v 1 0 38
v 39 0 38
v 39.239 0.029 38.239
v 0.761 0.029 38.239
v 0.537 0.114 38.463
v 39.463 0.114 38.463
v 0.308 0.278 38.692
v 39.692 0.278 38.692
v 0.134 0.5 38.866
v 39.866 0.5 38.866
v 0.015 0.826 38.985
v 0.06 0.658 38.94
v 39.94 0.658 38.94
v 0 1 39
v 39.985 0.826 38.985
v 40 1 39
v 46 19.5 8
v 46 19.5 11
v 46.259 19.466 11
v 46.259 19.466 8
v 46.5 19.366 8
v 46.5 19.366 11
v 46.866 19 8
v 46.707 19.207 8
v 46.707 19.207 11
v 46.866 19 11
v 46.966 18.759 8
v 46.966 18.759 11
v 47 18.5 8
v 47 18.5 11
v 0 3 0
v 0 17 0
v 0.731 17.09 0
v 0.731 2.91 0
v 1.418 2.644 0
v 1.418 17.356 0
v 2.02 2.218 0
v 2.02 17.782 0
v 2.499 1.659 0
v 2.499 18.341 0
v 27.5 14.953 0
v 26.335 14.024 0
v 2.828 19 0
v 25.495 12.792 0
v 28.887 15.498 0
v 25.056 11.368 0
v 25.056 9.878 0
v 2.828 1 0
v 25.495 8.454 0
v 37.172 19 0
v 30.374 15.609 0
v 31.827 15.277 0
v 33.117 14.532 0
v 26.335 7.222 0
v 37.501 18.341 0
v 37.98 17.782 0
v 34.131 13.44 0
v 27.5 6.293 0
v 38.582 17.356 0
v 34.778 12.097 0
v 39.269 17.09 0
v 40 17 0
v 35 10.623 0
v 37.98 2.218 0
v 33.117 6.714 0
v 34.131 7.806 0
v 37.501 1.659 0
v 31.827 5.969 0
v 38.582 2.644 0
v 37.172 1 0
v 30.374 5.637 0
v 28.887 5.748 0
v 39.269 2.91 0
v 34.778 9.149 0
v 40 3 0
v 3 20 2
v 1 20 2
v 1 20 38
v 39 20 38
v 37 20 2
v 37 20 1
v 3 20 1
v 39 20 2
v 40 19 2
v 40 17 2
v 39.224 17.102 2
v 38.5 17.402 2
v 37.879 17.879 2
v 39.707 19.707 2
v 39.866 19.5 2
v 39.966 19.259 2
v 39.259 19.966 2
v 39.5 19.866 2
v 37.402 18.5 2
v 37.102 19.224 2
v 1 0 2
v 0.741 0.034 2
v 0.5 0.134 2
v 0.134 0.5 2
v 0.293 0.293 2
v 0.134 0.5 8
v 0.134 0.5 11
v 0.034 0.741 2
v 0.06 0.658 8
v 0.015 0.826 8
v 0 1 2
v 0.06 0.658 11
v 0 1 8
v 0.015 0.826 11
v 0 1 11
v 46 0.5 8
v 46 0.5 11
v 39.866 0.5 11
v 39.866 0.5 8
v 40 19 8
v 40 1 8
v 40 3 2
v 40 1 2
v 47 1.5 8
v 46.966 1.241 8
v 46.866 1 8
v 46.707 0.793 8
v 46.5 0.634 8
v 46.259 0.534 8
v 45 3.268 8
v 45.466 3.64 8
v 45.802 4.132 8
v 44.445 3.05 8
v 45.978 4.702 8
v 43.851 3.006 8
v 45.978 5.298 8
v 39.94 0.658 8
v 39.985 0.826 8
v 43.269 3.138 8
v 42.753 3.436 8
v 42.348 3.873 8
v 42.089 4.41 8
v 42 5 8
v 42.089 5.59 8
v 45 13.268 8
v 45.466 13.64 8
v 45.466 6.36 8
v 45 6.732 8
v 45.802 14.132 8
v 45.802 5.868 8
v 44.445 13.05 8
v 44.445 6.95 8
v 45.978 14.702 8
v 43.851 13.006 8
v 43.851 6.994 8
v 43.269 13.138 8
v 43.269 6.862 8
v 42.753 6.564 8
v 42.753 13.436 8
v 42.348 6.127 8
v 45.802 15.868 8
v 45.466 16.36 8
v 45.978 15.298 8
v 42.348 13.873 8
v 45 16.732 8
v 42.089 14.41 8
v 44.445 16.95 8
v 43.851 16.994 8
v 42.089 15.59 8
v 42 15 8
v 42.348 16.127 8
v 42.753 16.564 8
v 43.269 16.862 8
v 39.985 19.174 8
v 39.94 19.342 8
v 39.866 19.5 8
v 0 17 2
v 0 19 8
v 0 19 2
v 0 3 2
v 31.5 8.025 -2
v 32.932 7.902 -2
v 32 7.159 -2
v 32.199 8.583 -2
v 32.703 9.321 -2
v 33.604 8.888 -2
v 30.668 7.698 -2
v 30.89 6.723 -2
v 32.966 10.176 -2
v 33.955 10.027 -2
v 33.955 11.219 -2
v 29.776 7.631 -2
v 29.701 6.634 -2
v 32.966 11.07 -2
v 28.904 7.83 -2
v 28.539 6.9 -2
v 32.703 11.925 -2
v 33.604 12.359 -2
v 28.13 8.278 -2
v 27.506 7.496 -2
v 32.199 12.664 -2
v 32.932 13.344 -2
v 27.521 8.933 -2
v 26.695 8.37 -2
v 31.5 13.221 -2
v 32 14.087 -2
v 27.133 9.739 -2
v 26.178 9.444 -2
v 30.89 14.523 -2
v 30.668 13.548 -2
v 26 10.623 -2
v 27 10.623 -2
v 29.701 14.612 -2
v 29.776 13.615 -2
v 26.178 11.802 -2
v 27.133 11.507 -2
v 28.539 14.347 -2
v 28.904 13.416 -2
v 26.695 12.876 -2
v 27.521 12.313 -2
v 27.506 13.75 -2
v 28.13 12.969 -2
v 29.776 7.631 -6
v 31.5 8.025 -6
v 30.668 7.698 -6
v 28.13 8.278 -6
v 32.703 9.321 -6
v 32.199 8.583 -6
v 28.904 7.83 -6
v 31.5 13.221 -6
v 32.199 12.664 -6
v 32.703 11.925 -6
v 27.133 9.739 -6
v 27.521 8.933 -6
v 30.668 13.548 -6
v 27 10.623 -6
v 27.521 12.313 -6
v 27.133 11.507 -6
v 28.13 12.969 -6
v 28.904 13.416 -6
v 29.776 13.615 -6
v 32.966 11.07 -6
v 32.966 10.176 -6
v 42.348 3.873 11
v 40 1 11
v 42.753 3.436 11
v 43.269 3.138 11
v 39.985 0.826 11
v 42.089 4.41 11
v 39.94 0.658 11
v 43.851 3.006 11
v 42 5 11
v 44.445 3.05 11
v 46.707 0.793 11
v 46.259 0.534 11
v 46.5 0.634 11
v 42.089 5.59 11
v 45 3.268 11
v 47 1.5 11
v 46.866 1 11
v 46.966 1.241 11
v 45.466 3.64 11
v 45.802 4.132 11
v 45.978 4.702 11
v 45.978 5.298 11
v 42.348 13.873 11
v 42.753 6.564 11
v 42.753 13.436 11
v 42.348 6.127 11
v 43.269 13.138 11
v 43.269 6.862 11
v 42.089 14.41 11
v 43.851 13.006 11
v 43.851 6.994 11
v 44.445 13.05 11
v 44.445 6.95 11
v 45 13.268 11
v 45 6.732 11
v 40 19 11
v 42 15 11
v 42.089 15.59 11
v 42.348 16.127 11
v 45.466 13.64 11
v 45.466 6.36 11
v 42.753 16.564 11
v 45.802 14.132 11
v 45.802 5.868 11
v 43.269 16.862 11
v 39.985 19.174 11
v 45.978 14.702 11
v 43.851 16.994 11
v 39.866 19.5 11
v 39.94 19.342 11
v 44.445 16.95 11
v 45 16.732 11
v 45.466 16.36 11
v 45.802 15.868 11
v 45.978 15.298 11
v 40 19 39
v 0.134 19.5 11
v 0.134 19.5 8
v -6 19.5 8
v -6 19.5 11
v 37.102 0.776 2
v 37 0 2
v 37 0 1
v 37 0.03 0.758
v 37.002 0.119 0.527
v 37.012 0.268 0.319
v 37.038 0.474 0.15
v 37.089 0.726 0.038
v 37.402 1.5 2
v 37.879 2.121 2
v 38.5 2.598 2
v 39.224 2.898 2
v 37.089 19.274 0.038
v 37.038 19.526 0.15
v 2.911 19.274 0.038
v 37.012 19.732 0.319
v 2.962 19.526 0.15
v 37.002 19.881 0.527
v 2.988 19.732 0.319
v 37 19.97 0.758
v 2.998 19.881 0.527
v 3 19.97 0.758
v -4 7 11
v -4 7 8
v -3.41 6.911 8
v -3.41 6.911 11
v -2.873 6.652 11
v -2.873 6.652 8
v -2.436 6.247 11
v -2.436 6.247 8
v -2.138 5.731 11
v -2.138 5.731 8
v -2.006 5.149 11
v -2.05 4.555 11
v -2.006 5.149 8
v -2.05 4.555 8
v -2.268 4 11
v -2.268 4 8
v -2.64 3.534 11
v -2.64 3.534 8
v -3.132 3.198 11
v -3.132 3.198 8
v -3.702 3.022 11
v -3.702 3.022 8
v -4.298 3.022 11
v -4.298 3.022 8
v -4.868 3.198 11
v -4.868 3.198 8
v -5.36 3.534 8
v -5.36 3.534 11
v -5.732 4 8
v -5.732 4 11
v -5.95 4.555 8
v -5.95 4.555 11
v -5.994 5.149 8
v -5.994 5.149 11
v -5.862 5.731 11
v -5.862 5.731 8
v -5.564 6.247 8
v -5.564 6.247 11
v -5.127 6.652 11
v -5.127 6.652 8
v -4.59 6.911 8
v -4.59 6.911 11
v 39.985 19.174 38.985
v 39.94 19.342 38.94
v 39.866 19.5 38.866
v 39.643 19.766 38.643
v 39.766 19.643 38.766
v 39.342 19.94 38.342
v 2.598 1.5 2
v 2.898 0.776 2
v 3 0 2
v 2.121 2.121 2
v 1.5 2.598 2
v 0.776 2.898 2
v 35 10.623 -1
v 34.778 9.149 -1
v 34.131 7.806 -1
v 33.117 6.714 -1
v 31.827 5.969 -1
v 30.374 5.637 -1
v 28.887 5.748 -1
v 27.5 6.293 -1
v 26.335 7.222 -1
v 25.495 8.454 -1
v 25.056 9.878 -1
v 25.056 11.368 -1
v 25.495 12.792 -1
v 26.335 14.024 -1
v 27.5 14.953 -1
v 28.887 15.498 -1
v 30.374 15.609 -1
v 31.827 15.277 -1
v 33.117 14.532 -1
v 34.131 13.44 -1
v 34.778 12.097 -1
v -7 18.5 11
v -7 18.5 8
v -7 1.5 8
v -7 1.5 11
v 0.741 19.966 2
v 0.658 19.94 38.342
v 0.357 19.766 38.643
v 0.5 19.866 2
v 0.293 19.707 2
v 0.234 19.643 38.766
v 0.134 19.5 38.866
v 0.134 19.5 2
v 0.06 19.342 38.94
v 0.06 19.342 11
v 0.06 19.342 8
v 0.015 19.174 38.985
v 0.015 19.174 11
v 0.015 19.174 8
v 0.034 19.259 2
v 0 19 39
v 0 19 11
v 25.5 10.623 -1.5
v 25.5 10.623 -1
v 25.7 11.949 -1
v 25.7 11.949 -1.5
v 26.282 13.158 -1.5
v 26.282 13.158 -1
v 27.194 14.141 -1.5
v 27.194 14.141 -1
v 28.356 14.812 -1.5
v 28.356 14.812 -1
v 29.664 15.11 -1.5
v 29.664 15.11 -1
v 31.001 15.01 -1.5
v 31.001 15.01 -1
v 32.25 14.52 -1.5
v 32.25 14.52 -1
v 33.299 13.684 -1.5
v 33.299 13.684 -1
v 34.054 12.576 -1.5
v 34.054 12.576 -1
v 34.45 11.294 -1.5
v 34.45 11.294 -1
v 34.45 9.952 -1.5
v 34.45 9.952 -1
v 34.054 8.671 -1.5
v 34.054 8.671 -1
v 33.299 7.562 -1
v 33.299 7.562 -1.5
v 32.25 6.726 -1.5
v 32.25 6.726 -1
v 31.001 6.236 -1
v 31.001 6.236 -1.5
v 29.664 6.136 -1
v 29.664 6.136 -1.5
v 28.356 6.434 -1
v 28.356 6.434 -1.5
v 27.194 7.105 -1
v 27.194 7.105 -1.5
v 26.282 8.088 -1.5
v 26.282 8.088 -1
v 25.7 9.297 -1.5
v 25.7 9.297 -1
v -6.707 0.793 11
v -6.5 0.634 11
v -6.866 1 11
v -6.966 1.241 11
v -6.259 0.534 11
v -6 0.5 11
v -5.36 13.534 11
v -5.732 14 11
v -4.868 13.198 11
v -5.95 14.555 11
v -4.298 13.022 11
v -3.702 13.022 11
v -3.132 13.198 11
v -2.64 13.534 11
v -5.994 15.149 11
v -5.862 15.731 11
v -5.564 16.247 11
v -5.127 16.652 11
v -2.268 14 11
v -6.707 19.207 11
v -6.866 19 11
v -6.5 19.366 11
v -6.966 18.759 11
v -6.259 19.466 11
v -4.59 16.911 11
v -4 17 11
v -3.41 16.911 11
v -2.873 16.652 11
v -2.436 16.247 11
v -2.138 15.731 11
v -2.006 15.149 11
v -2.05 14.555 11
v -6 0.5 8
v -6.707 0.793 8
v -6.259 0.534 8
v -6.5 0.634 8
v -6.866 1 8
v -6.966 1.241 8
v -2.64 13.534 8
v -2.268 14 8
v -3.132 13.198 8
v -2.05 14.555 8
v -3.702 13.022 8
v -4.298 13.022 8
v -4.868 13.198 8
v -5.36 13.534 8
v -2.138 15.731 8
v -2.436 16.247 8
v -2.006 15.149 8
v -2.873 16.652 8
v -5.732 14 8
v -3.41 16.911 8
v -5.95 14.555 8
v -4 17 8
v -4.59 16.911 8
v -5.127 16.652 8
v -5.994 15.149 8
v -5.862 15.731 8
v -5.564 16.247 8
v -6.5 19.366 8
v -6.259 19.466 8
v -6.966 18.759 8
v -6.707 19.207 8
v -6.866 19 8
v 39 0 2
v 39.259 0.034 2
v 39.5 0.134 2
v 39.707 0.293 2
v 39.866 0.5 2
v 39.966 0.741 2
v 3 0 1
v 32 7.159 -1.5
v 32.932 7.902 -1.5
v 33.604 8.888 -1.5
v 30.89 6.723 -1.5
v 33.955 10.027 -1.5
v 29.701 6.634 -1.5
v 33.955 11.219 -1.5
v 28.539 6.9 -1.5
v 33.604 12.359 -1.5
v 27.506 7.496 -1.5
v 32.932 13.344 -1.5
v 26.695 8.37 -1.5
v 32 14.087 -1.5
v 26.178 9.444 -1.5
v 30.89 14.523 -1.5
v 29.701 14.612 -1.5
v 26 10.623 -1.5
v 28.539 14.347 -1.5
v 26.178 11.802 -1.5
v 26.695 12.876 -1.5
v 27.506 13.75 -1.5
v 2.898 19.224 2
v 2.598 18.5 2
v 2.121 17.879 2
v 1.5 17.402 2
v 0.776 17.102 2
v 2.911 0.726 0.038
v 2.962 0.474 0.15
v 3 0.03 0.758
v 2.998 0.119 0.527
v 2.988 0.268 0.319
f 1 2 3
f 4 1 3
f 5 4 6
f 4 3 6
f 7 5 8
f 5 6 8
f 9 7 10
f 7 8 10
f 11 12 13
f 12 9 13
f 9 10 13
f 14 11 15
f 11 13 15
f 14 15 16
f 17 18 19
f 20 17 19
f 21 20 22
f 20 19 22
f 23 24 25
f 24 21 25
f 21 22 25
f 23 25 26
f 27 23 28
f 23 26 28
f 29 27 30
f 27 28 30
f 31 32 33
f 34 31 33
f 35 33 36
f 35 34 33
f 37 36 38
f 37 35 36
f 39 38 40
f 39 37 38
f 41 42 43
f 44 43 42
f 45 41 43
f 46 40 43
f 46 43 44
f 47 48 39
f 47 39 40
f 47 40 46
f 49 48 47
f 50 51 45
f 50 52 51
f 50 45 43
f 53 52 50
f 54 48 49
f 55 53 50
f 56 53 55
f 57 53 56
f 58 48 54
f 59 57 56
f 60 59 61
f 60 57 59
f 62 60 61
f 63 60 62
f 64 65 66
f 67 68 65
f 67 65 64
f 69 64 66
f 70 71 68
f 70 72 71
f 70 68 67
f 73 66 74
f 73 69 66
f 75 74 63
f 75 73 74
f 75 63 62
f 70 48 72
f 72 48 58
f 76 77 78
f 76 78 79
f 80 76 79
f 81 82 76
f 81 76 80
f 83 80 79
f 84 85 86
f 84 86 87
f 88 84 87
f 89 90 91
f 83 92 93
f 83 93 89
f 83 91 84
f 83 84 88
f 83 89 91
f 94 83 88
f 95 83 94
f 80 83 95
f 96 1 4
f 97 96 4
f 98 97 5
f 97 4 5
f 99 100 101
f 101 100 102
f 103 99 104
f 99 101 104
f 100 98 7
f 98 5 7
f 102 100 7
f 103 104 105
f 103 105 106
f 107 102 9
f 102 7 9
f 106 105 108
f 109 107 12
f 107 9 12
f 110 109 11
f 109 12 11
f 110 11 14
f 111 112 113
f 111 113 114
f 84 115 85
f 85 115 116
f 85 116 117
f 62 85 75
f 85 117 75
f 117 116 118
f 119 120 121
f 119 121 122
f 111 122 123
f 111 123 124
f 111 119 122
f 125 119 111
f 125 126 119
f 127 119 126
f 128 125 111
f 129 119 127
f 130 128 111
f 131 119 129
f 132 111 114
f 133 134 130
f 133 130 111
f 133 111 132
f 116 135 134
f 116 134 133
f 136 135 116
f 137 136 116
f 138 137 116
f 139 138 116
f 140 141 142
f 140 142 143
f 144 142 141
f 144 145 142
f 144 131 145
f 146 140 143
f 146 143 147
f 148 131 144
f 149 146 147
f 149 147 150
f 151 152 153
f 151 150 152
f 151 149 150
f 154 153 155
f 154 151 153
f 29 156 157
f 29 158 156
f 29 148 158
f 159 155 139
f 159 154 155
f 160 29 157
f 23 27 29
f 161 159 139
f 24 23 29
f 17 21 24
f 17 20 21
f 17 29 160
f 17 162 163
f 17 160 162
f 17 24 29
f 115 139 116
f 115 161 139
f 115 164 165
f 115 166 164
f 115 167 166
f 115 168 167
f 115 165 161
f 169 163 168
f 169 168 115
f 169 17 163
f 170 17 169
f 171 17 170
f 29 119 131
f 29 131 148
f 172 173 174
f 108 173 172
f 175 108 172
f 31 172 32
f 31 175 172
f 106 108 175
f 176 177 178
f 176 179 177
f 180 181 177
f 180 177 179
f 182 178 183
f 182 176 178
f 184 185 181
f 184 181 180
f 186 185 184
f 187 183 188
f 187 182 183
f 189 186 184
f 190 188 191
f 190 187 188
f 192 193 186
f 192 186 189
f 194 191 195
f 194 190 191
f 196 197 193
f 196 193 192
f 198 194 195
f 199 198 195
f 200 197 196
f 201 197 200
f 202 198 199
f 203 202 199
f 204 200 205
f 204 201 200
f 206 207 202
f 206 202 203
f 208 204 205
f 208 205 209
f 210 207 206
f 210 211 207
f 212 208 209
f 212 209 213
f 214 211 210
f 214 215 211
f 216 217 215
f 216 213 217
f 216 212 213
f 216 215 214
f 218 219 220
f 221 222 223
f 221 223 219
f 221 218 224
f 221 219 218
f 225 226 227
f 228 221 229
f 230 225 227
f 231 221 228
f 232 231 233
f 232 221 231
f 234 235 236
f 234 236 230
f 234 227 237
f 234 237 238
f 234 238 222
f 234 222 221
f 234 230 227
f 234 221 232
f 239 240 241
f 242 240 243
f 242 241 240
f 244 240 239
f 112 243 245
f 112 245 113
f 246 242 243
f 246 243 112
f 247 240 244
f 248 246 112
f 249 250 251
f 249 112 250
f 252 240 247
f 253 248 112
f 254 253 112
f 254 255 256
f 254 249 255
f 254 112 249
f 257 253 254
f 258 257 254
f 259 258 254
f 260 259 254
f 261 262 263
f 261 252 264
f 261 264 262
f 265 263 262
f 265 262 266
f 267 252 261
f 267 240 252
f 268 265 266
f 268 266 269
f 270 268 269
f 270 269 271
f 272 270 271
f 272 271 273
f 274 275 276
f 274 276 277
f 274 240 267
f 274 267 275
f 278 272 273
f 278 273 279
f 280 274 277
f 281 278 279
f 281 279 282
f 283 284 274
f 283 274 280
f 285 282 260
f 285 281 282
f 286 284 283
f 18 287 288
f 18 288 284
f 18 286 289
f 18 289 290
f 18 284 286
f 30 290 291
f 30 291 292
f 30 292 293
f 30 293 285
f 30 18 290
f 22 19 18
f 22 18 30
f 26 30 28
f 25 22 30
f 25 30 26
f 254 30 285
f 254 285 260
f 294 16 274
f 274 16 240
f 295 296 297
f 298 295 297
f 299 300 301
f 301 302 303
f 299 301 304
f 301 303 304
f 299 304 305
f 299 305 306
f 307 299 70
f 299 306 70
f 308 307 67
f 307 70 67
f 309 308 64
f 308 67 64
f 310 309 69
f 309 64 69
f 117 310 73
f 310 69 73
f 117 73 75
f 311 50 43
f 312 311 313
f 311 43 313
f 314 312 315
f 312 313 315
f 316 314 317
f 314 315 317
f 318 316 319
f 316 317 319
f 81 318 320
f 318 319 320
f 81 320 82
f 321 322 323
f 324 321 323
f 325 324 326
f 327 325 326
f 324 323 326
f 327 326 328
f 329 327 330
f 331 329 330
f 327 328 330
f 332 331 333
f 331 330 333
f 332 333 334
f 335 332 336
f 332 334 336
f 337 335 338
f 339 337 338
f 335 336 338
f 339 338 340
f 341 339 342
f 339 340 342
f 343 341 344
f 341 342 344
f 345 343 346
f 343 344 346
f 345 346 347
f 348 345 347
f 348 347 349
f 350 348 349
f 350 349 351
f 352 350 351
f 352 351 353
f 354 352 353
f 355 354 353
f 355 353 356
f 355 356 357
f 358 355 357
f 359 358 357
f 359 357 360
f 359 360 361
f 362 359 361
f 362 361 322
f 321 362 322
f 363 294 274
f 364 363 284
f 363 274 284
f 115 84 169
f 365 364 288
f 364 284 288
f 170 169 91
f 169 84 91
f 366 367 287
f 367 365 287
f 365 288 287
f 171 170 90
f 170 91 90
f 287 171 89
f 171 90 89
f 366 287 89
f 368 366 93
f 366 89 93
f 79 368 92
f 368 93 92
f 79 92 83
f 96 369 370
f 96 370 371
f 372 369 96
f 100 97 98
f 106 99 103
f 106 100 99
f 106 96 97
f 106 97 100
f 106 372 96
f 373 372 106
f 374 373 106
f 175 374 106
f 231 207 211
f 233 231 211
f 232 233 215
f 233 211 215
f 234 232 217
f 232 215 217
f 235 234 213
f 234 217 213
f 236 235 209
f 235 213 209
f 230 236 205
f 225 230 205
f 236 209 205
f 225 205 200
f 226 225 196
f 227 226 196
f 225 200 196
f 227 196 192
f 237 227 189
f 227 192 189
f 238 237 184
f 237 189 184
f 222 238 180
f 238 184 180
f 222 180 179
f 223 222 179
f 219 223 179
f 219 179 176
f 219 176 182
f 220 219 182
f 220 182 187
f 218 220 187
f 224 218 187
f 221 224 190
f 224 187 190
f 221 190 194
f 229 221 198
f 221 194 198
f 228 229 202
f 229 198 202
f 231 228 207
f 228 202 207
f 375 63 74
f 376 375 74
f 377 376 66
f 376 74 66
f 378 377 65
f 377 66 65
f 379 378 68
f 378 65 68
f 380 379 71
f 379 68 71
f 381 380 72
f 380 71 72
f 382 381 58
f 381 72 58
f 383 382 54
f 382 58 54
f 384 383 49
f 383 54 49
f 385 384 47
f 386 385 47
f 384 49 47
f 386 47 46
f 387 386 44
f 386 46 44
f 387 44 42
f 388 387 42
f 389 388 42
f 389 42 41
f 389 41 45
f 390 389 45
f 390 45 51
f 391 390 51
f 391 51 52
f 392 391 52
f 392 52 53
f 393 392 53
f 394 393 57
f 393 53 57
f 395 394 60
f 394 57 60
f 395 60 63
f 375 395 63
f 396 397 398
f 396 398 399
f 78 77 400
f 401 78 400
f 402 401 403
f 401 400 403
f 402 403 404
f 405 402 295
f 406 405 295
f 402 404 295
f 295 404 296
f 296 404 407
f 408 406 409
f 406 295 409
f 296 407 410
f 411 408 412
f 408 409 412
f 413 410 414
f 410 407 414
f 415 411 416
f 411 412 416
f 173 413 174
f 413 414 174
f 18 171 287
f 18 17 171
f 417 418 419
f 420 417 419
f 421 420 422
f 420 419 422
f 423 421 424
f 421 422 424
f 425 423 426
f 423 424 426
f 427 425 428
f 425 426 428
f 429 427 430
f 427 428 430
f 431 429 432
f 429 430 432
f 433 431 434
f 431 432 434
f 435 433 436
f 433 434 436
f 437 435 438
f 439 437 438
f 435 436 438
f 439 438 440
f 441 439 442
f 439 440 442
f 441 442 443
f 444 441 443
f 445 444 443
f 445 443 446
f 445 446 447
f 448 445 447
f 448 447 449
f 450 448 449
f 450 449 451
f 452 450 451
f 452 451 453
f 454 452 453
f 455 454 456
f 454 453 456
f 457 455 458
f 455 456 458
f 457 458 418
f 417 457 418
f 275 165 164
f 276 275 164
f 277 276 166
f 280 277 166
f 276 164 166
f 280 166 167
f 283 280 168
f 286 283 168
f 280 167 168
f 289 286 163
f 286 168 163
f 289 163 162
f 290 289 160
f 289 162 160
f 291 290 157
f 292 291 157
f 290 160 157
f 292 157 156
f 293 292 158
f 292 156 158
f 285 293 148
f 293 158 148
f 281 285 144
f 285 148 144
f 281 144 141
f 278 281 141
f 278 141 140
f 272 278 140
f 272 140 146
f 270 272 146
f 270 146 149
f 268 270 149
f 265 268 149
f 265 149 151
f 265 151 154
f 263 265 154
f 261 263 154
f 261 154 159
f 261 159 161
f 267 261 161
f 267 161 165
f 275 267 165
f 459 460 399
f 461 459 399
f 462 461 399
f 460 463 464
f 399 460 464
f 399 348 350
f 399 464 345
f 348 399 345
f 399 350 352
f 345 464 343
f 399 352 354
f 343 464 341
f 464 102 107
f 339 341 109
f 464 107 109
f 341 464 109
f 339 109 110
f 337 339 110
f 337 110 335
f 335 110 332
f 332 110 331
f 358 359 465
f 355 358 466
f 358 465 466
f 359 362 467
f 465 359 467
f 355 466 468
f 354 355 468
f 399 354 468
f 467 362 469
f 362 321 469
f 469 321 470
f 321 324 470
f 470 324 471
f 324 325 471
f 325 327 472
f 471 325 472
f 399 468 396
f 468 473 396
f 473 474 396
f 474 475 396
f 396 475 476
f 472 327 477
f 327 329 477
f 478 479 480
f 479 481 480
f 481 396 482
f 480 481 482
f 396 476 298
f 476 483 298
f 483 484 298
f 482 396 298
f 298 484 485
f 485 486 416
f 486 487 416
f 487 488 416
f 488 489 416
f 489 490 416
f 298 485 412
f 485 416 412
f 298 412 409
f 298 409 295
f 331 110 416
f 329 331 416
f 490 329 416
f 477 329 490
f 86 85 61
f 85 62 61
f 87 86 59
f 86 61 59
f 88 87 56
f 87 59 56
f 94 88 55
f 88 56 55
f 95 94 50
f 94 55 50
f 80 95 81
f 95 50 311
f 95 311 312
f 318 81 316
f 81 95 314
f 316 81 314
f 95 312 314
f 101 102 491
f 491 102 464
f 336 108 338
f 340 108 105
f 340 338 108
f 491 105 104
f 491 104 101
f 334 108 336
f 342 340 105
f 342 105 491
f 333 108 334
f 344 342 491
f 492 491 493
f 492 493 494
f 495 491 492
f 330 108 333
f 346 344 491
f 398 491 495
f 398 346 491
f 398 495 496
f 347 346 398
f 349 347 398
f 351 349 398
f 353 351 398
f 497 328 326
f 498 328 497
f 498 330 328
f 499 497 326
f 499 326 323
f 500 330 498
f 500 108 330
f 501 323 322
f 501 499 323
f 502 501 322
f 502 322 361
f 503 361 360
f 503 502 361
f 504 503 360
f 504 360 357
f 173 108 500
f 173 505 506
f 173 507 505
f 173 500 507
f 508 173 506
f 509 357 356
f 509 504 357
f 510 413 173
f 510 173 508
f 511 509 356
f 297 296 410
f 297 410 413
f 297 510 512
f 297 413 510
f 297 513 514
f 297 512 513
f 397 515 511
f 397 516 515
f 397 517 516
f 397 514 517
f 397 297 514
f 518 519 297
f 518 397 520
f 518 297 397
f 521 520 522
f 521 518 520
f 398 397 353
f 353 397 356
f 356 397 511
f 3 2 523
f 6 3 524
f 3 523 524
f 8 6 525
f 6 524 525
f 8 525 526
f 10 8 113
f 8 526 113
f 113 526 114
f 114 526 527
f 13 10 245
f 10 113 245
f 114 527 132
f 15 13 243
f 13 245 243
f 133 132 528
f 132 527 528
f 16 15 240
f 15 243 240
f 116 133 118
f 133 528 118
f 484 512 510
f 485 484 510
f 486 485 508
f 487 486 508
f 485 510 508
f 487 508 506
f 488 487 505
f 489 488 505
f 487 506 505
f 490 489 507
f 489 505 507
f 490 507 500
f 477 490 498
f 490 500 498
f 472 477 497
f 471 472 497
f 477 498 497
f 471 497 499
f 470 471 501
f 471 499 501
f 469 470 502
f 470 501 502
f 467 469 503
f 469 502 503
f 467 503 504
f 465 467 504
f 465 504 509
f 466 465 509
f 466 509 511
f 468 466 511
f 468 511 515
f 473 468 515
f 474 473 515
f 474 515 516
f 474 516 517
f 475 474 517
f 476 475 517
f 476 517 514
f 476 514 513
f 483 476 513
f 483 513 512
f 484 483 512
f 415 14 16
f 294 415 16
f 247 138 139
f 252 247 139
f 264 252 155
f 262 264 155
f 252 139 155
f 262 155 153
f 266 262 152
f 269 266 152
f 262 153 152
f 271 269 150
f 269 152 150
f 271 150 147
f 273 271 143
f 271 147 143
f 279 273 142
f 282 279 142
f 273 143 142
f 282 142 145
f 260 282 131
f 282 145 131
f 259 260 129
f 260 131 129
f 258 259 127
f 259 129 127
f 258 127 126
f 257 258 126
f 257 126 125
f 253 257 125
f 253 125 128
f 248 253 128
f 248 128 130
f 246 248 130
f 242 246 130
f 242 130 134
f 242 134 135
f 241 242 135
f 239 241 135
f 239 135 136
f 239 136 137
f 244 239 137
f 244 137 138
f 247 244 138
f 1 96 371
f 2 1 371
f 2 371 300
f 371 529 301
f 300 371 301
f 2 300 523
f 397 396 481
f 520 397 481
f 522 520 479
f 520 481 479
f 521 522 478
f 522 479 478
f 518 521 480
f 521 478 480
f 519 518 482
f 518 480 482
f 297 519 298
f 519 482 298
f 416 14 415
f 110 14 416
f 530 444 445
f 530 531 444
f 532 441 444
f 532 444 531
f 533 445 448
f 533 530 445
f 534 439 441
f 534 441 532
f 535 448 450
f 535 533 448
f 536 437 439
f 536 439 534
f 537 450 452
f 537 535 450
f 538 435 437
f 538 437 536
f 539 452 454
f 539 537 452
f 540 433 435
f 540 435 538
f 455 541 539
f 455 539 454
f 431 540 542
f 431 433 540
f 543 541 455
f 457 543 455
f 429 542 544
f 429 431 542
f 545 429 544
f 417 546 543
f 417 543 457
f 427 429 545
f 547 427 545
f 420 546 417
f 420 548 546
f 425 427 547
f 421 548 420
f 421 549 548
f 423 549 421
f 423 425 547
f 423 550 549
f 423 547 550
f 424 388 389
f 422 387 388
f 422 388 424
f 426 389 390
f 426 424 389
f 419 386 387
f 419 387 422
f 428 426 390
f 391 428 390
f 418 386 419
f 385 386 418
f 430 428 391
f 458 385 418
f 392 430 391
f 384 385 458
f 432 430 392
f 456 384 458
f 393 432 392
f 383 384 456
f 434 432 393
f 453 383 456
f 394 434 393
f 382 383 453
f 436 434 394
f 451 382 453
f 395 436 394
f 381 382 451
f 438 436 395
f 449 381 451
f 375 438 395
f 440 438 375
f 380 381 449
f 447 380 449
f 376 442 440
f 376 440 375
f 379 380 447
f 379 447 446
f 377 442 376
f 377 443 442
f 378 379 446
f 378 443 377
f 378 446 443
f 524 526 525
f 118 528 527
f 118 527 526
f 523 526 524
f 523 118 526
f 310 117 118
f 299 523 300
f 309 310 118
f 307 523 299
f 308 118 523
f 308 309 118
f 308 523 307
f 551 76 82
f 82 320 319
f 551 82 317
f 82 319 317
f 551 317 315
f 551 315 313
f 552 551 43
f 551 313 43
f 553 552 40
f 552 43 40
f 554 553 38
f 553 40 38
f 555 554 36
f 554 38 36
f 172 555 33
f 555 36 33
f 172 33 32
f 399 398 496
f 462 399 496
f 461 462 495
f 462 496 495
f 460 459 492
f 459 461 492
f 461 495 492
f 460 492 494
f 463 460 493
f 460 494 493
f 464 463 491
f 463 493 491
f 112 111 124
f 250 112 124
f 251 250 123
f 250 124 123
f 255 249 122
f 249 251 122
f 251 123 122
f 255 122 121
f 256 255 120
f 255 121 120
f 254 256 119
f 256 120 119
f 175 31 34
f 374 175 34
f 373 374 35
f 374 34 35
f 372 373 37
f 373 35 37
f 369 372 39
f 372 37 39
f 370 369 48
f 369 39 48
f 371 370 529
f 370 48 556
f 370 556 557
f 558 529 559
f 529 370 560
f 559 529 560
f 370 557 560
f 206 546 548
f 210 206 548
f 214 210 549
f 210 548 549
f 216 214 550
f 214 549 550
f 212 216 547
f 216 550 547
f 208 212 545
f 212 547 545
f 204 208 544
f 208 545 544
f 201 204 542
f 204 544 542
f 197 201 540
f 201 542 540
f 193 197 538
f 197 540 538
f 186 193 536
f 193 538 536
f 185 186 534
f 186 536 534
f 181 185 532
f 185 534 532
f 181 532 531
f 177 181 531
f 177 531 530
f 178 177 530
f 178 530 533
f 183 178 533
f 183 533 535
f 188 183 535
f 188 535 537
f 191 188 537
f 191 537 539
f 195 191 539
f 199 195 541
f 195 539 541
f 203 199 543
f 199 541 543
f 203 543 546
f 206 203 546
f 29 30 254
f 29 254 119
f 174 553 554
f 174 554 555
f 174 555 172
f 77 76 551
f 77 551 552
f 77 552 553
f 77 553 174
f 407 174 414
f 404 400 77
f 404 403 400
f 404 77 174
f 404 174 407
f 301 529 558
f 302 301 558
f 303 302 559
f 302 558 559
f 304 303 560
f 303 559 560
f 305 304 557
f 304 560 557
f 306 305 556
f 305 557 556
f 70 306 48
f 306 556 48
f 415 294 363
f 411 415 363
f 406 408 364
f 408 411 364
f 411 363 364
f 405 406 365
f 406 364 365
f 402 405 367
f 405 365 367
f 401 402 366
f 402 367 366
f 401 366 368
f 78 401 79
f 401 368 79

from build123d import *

# Parameters (mm, degrees)
SKETCH_1_W               = 40
SKETCH_1_H               = 39
EXTRUDE_1_DEPTH          = 20
SKETCH_6_R               = 5
EXTRUDE_3_DEPTH          = 1
SKETCH_7_R               = 4.5
EXTRUDE_4_DEPTH          = 0.5
SKETCH_8_R               = 4
EXTRUDE_5_DEPTH          = 0.5
SKETCH_9_R               = 3
EXTRUDE_6_DEPTH          = 4
SKETCH_11_W              = 3
SKETCH_11_H              = 20
EXTRUDE_7_DEPTH          = 7
SKETCH_12_R              = 2
CUT_EXTRUDE_2_DEPTH      = 7
SKETCH_13_W              = 3
SKETCH_13_H              = 20
EXTRUDE_8_DEPTH          = 7
SKETCH_14_R              = 2
CUT_EXTRUDE_3_DEPTH      = 7
SKETCH_15_R              = 3
CUT_EXTRUDE_4_DEPTH      = 2
CUT_EXTRUDE_6_DEPTH      = 65.265076052
CUT_EXTRUDE_6_DEPTH_BACK = 0.5
CUT_EXTRUDE_7_DEPTH      = 65.265076052
CUT_EXTRUDE_7_DEPTH_BACK = 0.5
CUT_EXTRUDE_8_DEPTH      = 65.265076052
CUT_EXTRUDE_8_DEPTH_BACK = 0.5
CUT_EXTRUDE_9_DEPTH      = 65.265076052
CUT_EXTRUDE_9_DEPTH_BACK = 0.5
FILLET_3_R               = 1


with BuildPart() as part:
    # 草图1 → 凸台-拉伸1 (new body)
    with BuildSketch(Plane(origin=(0, 0, 0), x_dir=(1, 0, 0), z_dir=(0, 1, 0))):
        with Locations((20, -19.5)):
            Rectangle(SKETCH_1_W, SKETCH_1_H)
    extrude(amount=EXTRUDE_1_DEPTH)

    # 草图6 → 凸台-拉伸3 (add)
    with BuildSketch(Plane(origin=(0, 0, 0), x_dir=(-1, 0, 0), z_dir=(0, 0, -1))):
        with Locations(Location((-30, 10.62304624, 0), (0, 0, 180))):
            Circle(SKETCH_6_R)
    extrude(amount=EXTRUDE_3_DEPTH)

    # 草图7 → 凸台-拉伸4 (add)
    with BuildSketch(Plane(origin=(0, 0, -1), x_dir=(-1, 0, 0), z_dir=(0, 0, -1))):
        with Locations((-30, 10.62304624)):
            Circle(SKETCH_7_R)
    extrude(amount=EXTRUDE_4_DEPTH)

    # 草图8 → 凸台-拉伸5 (add)
    with BuildSketch(Plane(origin=(0, 0, -1.5), x_dir=(-1, 0, 0), z_dir=(0, 0, -1))):
        with Locations((-30, 10.62304624)):
            Circle(SKETCH_8_R)
    extrude(amount=EXTRUDE_5_DEPTH)

    # 草图9 → 凸台-拉伸6 (add)
    with BuildSketch(Plane(origin=(0, 0, -2), x_dir=(-1, 0, 0), z_dir=(0, 0, -1))):
        with Locations((-30, 10.62304624)):
            Circle(SKETCH_9_R)
    extrude(amount=EXTRUDE_6_DEPTH)

    # 草图11 → 凸台-拉伸7 (add)
    with BuildSketch(Plane(origin=(40, 0, 0), x_dir=(0, 0, -1), z_dir=(1, 0, 0))):
        with Locations((-9.5, 10)):
            Rectangle(SKETCH_11_W, SKETCH_11_H)
    extrude(amount=EXTRUDE_7_DEPTH)

    # 草图12 → 切除-拉伸2 (cut)
    with BuildSketch(Plane(origin=(0, 0, 8), x_dir=(-1, 0, 0), z_dir=(0, 0, -1))):
        with Locations((-44, 15)):
            Circle(SKETCH_12_R)
        with Locations((-44, 5)):
            Circle(SKETCH_12_R)
    extrude(amount=-CUT_EXTRUDE_2_DEPTH, mode=Mode.SUBTRACT)

    # 草图13 → 凸台-拉伸8 (add)
    with BuildSketch(Plane.ZY):
        with Locations((9.5, 10)):
            Rectangle(SKETCH_13_W, SKETCH_13_H)
    extrude(amount=EXTRUDE_8_DEPTH)

    # 草图14 → 切除-拉伸3 (cut)
    with BuildSketch(Plane(origin=(0, 0, 8), x_dir=(-1, 0, 0), z_dir=(0, 0, -1))):
        with Locations(Location((4, 15, 0), (0, 0, 90))):
            Circle(SKETCH_14_R)
        with Locations(Location((4, 5, 0), (0, 0, 90))):
            Circle(SKETCH_14_R)
    extrude(amount=-CUT_EXTRUDE_3_DEPTH, mode=Mode.SUBTRACT)

    # 草图15 → 切除-拉伸4 (cut)
    with BuildSketch(Plane(origin=(0, 0, 0), x_dir=(-1, 0, 0), z_dir=(0, 0, -1))):
        with Locations((-40, 20)):
            Circle(SKETCH_15_R)
        with Locations((0, 20)):
            Circle(SKETCH_15_R)
        Circle(SKETCH_15_R)
        with Locations((-40, 0)):
            Circle(SKETCH_15_R)
    extrude(amount=-CUT_EXTRUDE_4_DEPTH, mode=Mode.SUBTRACT)

    # 草图16 → 切除-拉伸6 (cut, two sides: drawn at the far end of the back side and taken through both)
    with BuildSketch(Plane(origin=(0, 20, 0), x_dir=(1, 0, 0), z_dir=(0, 1, 0)).offset(-CUT_EXTRUDE_6_DEPTH_BACK)):
        Polygon((0, 114.605506082), (0, -8), (0, -11), (0, -133.605506082), (-245.211012164, -133.605506082), (-245.211012164, 114.605506082), align=None)
    extrude(amount=CUT_EXTRUDE_6_DEPTH + CUT_EXTRUDE_6_DEPTH_BACK, mode=Mode.SUBTRACT)

    # 草图17 → 切除-拉伸7 (cut, two sides: drawn at the far end of the back side and taken through both)
    with BuildSketch(Plane(origin=(0, 20, 0), x_dir=(1, 0, 0), z_dir=(0, 1, 0)).offset(-CUT_EXTRUDE_7_DEPTH_BACK)):
        Polygon((40, 114.605506082), (40, -8), (40, -11), (40, -133.605506082), (285.211012164, -133.605506082), (285.211012164, 114.605506082), align=None)
    extrude(amount=CUT_EXTRUDE_7_DEPTH + CUT_EXTRUDE_7_DEPTH_BACK, mode=Mode.SUBTRACT)

    # 草图19 → 切除-拉伸8 (cut, two sides: drawn at the far end of the back side and taken through both)
    with BuildSketch(Plane.XZ.offset(-CUT_EXTRUDE_8_DEPTH_BACK)):
        Polygon((0, 133.605506082), (0, 11), (0, 8), (0, -114.605506082), (-245.211012164, -114.605506082), (-245.211012164, 133.605506082), align=None)
    extrude(amount=CUT_EXTRUDE_8_DEPTH + CUT_EXTRUDE_8_DEPTH_BACK, mode=Mode.SUBTRACT)

    # 草图20 → 切除-拉伸9 (cut, two sides: drawn at the far end of the back side and taken through both)
    with BuildSketch(Plane.XZ.offset(-CUT_EXTRUDE_9_DEPTH_BACK)):
        Polygon((40, 133.605506082), (40, 11), (40, 8), (40, -114.605506082), (285.211012164, -114.605506082), (285.211012164, 133.605506082), align=None)
    extrude(amount=CUT_EXTRUDE_9_DEPTH + CUT_EXTRUDE_9_DEPTH_BACK, mode=Mode.SUBTRACT)

    # 圆角3
    # the kernel refuses this fillet: 1 mm, written as the material it takes off along each edge
    with BuildSketch(Plane(origin=(42.5, 0, 39), x_dir=(0, 1, 0), z_dir=(-1, 0, 0))) as fillet_3_piece_1:
        with BuildLine():
            CenterArc((FILLET_3_R, FILLET_3_R), FILLET_3_R, 180, 90)
            Line((0, FILLET_3_R), (0, 0))
            Line((0, 0), (FILLET_3_R, 0))
        make_face()
    extrude(amount=45, mode=Mode.SUBTRACT)
    with BuildSketch(Plane(origin=(42.5, 20, 39), x_dir=(0, -1, 0), z_dir=(-1, 0, 0))) as fillet_3_piece_2:
        with BuildLine():
            CenterArc((FILLET_3_R, -FILLET_3_R), FILLET_3_R, 90, 90)
            Line((0, -FILLET_3_R), (0, 0))
            Line((0, 0), (FILLET_3_R, 0))
        make_face()
    extrude(amount=45, mode=Mode.SUBTRACT)
    with BuildSketch(Plane(origin=(0, 0, 41.5), x_dir=(0, 1, 0), z_dir=(0, 0, -1))) as fillet_3_piece_3_section:
        with BuildLine():
            CenterArc((FILLET_3_R, FILLET_3_R), FILLET_3_R, 180, 90)
            Line((0, FILLET_3_R), (0, 0))
            Line((0, 0), (FILLET_3_R, 0))
        make_face()
    fillet_3_piece_3 = extrude(amount=42, mode=Mode.PRIVATE)
    fillet_3_piece_3 = split(fillet_3_piece_3, bisect_by=Plane(origin=(0.024008382, 0.663250785, 11), z_dir=(0, 0, 1)), keep=Keep.TOP, mode=Mode.PRIVATE)
    fillet_3_piece_3 = split(fillet_3_piece_3, bisect_by=Plane(origin=(0.024008382, 0.5, 26.25), z_dir=(0, 1, 0)), keep=Keep.TOP, mode=Mode.PRIVATE)
    add(fillet_3_piece_3, mode=Mode.SUBTRACT)
    with BuildSketch(Plane(origin=(0, 0, 41.5), x_dir=(0, 1, 0), z_dir=(0, 0, -1))) as fillet_3_piece_4_section:
        with BuildLine():
            CenterArc((FILLET_3_R, FILLET_3_R), FILLET_3_R, 180, 90)
            Line((0, FILLET_3_R), (0, 0))
            Line((0, 0), (FILLET_3_R, 0))
        make_face()
    fillet_3_piece_4 = extrude(amount=42, mode=Mode.PRIVATE)
    fillet_3_piece_4 = split(fillet_3_piece_4, bisect_by=Plane(origin=(0.25512006, 0.164391764, 11), z_dir=(0, 0, 1)), keep=Keep.TOP, mode=Mode.PRIVATE)
    fillet_3_piece_4 = split(fillet_3_piece_4, bisect_by=Plane(origin=(0.25512006, 0.5, 26.25), z_dir=(0, -1, 0)), keep=Keep.TOP, mode=Mode.PRIVATE)
    add(fillet_3_piece_4, mode=Mode.SUBTRACT)
    with BuildSketch(Plane(origin=(0, 0, 41.5), x_dir=(0, 1, 0), z_dir=(0, 0, -1))) as fillet_3_piece_5_section:
        with BuildLine():
            CenterArc((FILLET_3_R, FILLET_3_R), FILLET_3_R, 180, 90)
            Line((0, FILLET_3_R), (0, 0))
            Line((0, 0), (FILLET_3_R, 0))
        make_face()
    fillet_3_piece_5 = extrude(amount=42, mode=Mode.PRIVATE)
    fillet_3_piece_5 = split(fillet_3_piece_5, bisect_by=Plane(origin=(0.25512006, 0.164391764, 11), z_dir=(0, 0, -1)), keep=Keep.TOP, mode=Mode.PRIVATE)
    fillet_3_piece_5 = split(fillet_3_piece_5, bisect_by=Plane(origin=(0.25512006, 0.5, 9.5), z_dir=(0, -1, 0)), keep=Keep.TOP, mode=Mode.PRIVATE)
    fillet_3_piece_5 = split(fillet_3_piece_5, bisect_by=Plane(origin=(0.25512006, 0.164391764, 8), z_dir=(0, 0, 1)), keep=Keep.TOP, mode=Mode.PRIVATE)
    add(fillet_3_piece_5, mode=Mode.SUBTRACT)
    with BuildSketch(Plane(origin=(0, 0, 41.5), x_dir=(0, 1, 0), z_dir=(0, 0, -1))) as fillet_3_piece_6_section:
        with BuildLine():
            CenterArc((FILLET_3_R, FILLET_3_R), FILLET_3_R, 180, 90)
            Line((0, FILLET_3_R), (0, 0))
            Line((0, 0), (FILLET_3_R, 0))
        make_face()
    fillet_3_piece_6 = extrude(amount=42, mode=Mode.PRIVATE)
    fillet_3_piece_6 = split(fillet_3_piece_6, bisect_by=Plane(origin=(0.024008382, 0.5, 3.75), z_dir=(0, 1, 0)), keep=Keep.TOP, mode=Mode.PRIVATE)
    fillet_3_piece_6 = split(fillet_3_piece_6, bisect_by=Plane(origin=(0.024008382, 0.663250785, 8), z_dir=(0, 0, -1)), keep=Keep.TOP, mode=Mode.PRIVATE)
    add(fillet_3_piece_6, mode=Mode.SUBTRACT)
    with BuildSketch(Plane(origin=(0, 0, 41.5), x_dir=(0, 1, 0), z_dir=(0, 0, -1))) as fillet_3_piece_7_section:
        with BuildLine():
            CenterArc((FILLET_3_R, FILLET_3_R), FILLET_3_R, 180, 90)
            Line((0, FILLET_3_R), (0, 0))
            Line((0, 0), (FILLET_3_R, 0))
        make_face()
    fillet_3_piece_7 = extrude(amount=42, mode=Mode.PRIVATE)
    fillet_3_piece_7 = split(fillet_3_piece_7, bisect_by=Plane(origin=(0.25512006, 0.5, 3.75), z_dir=(0, -1, 0)), keep=Keep.TOP, mode=Mode.PRIVATE)
    fillet_3_piece_7 = split(fillet_3_piece_7, bisect_by=Plane(origin=(0.25512006, 0.164391764, 8), z_dir=(0, 0, -1)), keep=Keep.TOP, mode=Mode.PRIVATE)
    add(fillet_3_piece_7, mode=Mode.SUBTRACT)
    with BuildSketch(Plane(origin=(-7, 0.5, 5.5), x_dir=(0, 1, 0), z_dir=(0, 0, 1)), Plane(origin=(47, 19.5, 13.5), x_dir=(-1, 0, 0), z_dir=(0, 0, -1))) as fillet_3_piece_8:
        with BuildLine():
            CenterArc((FILLET_3_R, -FILLET_3_R), FILLET_3_R, 90, 90)
            Line((0, -FILLET_3_R), (0, 0))
            Line((0, 0), (FILLET_3_R, 0))
        make_face()
    extrude(amount=8, mode=Mode.SUBTRACT)
    with BuildSketch(Plane(origin=(0.5, 0, 0), x_dir=(0, 1, 0), z_dir=(1, 0, 0))) as fillet_3_piece_9:
        with BuildLine():
            CenterArc((FILLET_3_R, FILLET_3_R), FILLET_3_R, 180, 90)
            Line((0, FILLET_3_R), (0, 0))
            Line((0, 0), (FILLET_3_R, 0))
        make_face()
    extrude(amount=39, mode=Mode.SUBTRACT)
    with BuildSketch(Plane(origin=(47, 0.5, 5.5), x_dir=(0, 1, 0), z_dir=(0, 0, 1)), Plane(origin=(-7, 19.5, 13.5), x_dir=(1, 0, 0), z_dir=(0, 0, -1))) as fillet_3_piece_10:
        with BuildLine():
            CenterArc((FILLET_3_R, FILLET_3_R), FILLET_3_R, 180, 90)
            Line((0, FILLET_3_R), (0, 0))
            Line((0, 0), (FILLET_3_R, 0))
        make_face()
    extrude(amount=8, mode=Mode.SUBTRACT)
    with BuildSketch(Plane(origin=(40, 0, -0.5), x_dir=(0, 1, 0), z_dir=(0, 0, 1))) as fillet_3_piece_11_section:
        with BuildLine():
            CenterArc((FILLET_3_R, FILLET_3_R), FILLET_3_R, 180, 90)
            Line((0, FILLET_3_R), (0, 0))
            Line((0, 0), (FILLET_3_R, 0))
        make_face()
    fillet_3_piece_11 = extrude(amount=42, mode=Mode.PRIVATE)
    fillet_3_piece_11 = split(fillet_3_piece_11, bisect_by=Plane(origin=(39.975991618, 0.663250785, 8), z_dir=(0, 0, -1)), keep=Keep.TOP, mode=Mode.PRIVATE)
    fillet_3_piece_11 = split(fillet_3_piece_11, bisect_by=Plane(origin=(39.975991618, 0.5, 3.75), z_dir=(0, 1, 0)), keep=Keep.TOP, mode=Mode.PRIVATE)
    add(fillet_3_piece_11, mode=Mode.SUBTRACT)
    with BuildSketch(Plane(origin=(40, 0, -0.5), x_dir=(0, 1, 0), z_dir=(0, 0, 1))) as fillet_3_piece_12_section:
        with BuildLine():
            CenterArc((FILLET_3_R, FILLET_3_R), FILLET_3_R, 180, 90)
            Line((0, FILLET_3_R), (0, 0))
            Line((0, 0), (FILLET_3_R, 0))
        make_face()
    fillet_3_piece_12 = extrude(amount=42, mode=Mode.PRIVATE)
    fillet_3_piece_12 = split(fillet_3_piece_12, bisect_by=Plane(origin=(39.74487994, 0.164391764, 8), z_dir=(0, 0, -1)), keep=Keep.TOP, mode=Mode.PRIVATE)
    fillet_3_piece_12 = split(fillet_3_piece_12, bisect_by=Plane(origin=(39.74487994, 0.5, 3.75), z_dir=(0, -1, 0)), keep=Keep.TOP, mode=Mode.PRIVATE)
    add(fillet_3_piece_12, mode=Mode.SUBTRACT)
    with BuildSketch(Plane(origin=(40, 0, -0.5), x_dir=(0, 1, 0), z_dir=(0, 0, 1))) as fillet_3_piece_13_section:
        with BuildLine():
            CenterArc((FILLET_3_R, FILLET_3_R), FILLET_3_R, 180, 90)
            Line((0, FILLET_3_R), (0, 0))
            Line((0, 0), (FILLET_3_R, 0))
        make_face()
    fillet_3_piece_13 = extrude(amount=42, mode=Mode.PRIVATE)
    fillet_3_piece_13 = split(fillet_3_piece_13, bisect_by=Plane(origin=(39.74487994, 0.164391764, 8), z_dir=(0, 0, 1)), keep=Keep.TOP, mode=Mode.PRIVATE)
    fillet_3_piece_13 = split(fillet_3_piece_13, bisect_by=Plane(origin=(39.74487994, 0.5, 9.5), z_dir=(0, -1, 0)), keep=Keep.TOP, mode=Mode.PRIVATE)
    fillet_3_piece_13 = split(fillet_3_piece_13, bisect_by=Plane(origin=(39.74487994, 0.164391764, 11), z_dir=(0, 0, -1)), keep=Keep.TOP, mode=Mode.PRIVATE)
    add(fillet_3_piece_13, mode=Mode.SUBTRACT)
    with BuildSketch(Plane(origin=(40, 0, -0.5), x_dir=(0, 1, 0), z_dir=(0, 0, 1))) as fillet_3_piece_14_section:
        with BuildLine():
            CenterArc((FILLET_3_R, FILLET_3_R), FILLET_3_R, 180, 90)
            Line((0, FILLET_3_R), (0, 0))
            Line((0, 0), (FILLET_3_R, 0))
        make_face()
    fillet_3_piece_14 = extrude(amount=42, mode=Mode.PRIVATE)
    fillet_3_piece_14 = split(fillet_3_piece_14, bisect_by=Plane(origin=(39.975991618, 0.5, 26.25), z_dir=(0, 1, 0)), keep=Keep.TOP, mode=Mode.PRIVATE)
    fillet_3_piece_14 = split(fillet_3_piece_14, bisect_by=Plane(origin=(39.975991618, 0.663250785, 11), z_dir=(0, 0, 1)), keep=Keep.TOP, mode=Mode.PRIVATE)
    add(fillet_3_piece_14, mode=Mode.SUBTRACT)
    with BuildSketch(Plane(origin=(40, 0, -0.5), x_dir=(0, 1, 0), z_dir=(0, 0, 1))) as fillet_3_piece_15_section:
        with BuildLine():
            CenterArc((FILLET_3_R, FILLET_3_R), FILLET_3_R, 180, 90)
            Line((0, FILLET_3_R), (0, 0))
            Line((0, 0), (FILLET_3_R, 0))
        make_face()
    fillet_3_piece_15 = extrude(amount=42, mode=Mode.PRIVATE)
    fillet_3_piece_15 = split(fillet_3_piece_15, bisect_by=Plane(origin=(39.74487994, 0.5, 26.25), z_dir=(0, -1, 0)), keep=Keep.TOP, mode=Mode.PRIVATE)
    fillet_3_piece_15 = split(fillet_3_piece_15, bisect_by=Plane(origin=(39.74487994, 0.164391764, 11), z_dir=(0, 0, 1)), keep=Keep.TOP, mode=Mode.PRIVATE)
    add(fillet_3_piece_15, mode=Mode.SUBTRACT)
    with BuildSketch(Plane(origin=(40, 20, -0.5), x_dir=(-1, 0, 0), z_dir=(0, 0, 1))) as fillet_3_piece_16_section:
        with BuildLine():
            CenterArc((FILLET_3_R, FILLET_3_R), FILLET_3_R, 180, 90)
            Line((0, FILLET_3_R), (0, 0))
            Line((0, 0), (FILLET_3_R, 0))
        make_face()
    fillet_3_piece_16 = extrude(amount=42, mode=Mode.PRIVATE)
    fillet_3_piece_16 = split(fillet_3_piece_16, bisect_by=Plane(origin=(39.74487994, 19.835608236, 8), z_dir=(0, 0, -1)), keep=Keep.TOP, mode=Mode.PRIVATE)
    fillet_3_piece_16 = split(fillet_3_piece_16, bisect_by=Plane(origin=(39.74487994, 19.5, 3.75), z_dir=(0, 1, 0)), keep=Keep.TOP, mode=Mode.PRIVATE)
    add(fillet_3_piece_16, mode=Mode.SUBTRACT)
    with BuildSketch(Plane(origin=(40, 20, -0.5), x_dir=(-1, 0, 0), z_dir=(0, 0, 1))) as fillet_3_piece_17_section:
        with BuildLine():
            CenterArc((FILLET_3_R, FILLET_3_R), FILLET_3_R, 180, 90)
            Line((0, FILLET_3_R), (0, 0))
            Line((0, 0), (FILLET_3_R, 0))
        make_face()
    fillet_3_piece_17 = extrude(amount=42, mode=Mode.PRIVATE)
    fillet_3_piece_17 = split(fillet_3_piece_17, bisect_by=Plane(origin=(39.975991618, 19.336749215, 8), z_dir=(0, 0, -1)), keep=Keep.TOP, mode=Mode.PRIVATE)
    fillet_3_piece_17 = split(fillet_3_piece_17, bisect_by=Plane(origin=(39.975991618, 19.5, 3.75), z_dir=(0, -1, 0)), keep=Keep.TOP, mode=Mode.PRIVATE)
    add(fillet_3_piece_17, mode=Mode.SUBTRACT)
    with BuildSketch(Plane(origin=(40, 20, -0.5), x_dir=(-1, 0, 0), z_dir=(0, 0, 1))) as fillet_3_piece_18_section:
        with BuildLine():
            CenterArc((FILLET_3_R, FILLET_3_R), FILLET_3_R, 180, 90)
            Line((0, FILLET_3_R), (0, 0))
            Line((0, 0), (FILLET_3_R, 0))
        make_face()
    fillet_3_piece_18 = extrude(amount=42, mode=Mode.PRIVATE)
    fillet_3_piece_18 = split(fillet_3_piece_18, bisect_by=Plane(origin=(39.74487994, 19.835608236, 8), z_dir=(0, 0, 1)), keep=Keep.TOP, mode=Mode.PRIVATE)
    fillet_3_piece_18 = split(fillet_3_piece_18, bisect_by=Plane(origin=(39.74487994, 19.835608236, 11), z_dir=(0, 0, -1)), keep=Keep.TOP, mode=Mode.PRIVATE)
    fillet_3_piece_18 = split(fillet_3_piece_18, bisect_by=Plane(origin=(39.74487994, 19.5, 9.5), z_dir=(0, 1, 0)), keep=Keep.TOP, mode=Mode.PRIVATE)
    add(fillet_3_piece_18, mode=Mode.SUBTRACT)
    with BuildSketch(Plane(origin=(40, 20, -0.5), x_dir=(-1, 0, 0), z_dir=(0, 0, 1))) as fillet_3_piece_19_section:
        with BuildLine():
            CenterArc((FILLET_3_R, FILLET_3_R), FILLET_3_R, 180, 90)
            Line((0, FILLET_3_R), (0, 0))
            Line((0, 0), (FILLET_3_R, 0))
        make_face()
    fillet_3_piece_19 = extrude(amount=42, mode=Mode.PRIVATE)
    fillet_3_piece_19 = split(fillet_3_piece_19, bisect_by=Plane(origin=(39.74487994, 19.835608236, 11), z_dir=(0, 0, 1)), keep=Keep.TOP, mode=Mode.PRIVATE)
    fillet_3_piece_19 = split(fillet_3_piece_19, bisect_by=Plane(origin=(39.74487994, 19.5, 26.25), z_dir=(0, 1, 0)), keep=Keep.TOP, mode=Mode.PRIVATE)
    add(fillet_3_piece_19, mode=Mode.SUBTRACT)
    with BuildSketch(Plane(origin=(40, 20, -0.5), x_dir=(-1, 0, 0), z_dir=(0, 0, 1))) as fillet_3_piece_20_section:
        with BuildLine():
            CenterArc((FILLET_3_R, FILLET_3_R), FILLET_3_R, 180, 90)
            Line((0, FILLET_3_R), (0, 0))
            Line((0, 0), (FILLET_3_R, 0))
        make_face()
    fillet_3_piece_20 = extrude(amount=42, mode=Mode.PRIVATE)
    fillet_3_piece_20 = split(fillet_3_piece_20, bisect_by=Plane(origin=(39.975991618, 19.336749215, 11), z_dir=(0, 0, 1)), keep=Keep.TOP, mode=Mode.PRIVATE)
    fillet_3_piece_20 = split(fillet_3_piece_20, bisect_by=Plane(origin=(39.975991618, 19.5, 26.25), z_dir=(0, -1, 0)), keep=Keep.TOP, mode=Mode.PRIVATE)
    add(fillet_3_piece_20, mode=Mode.SUBTRACT)
    with BuildSketch(Plane(origin=(0.5, 20, 0), x_dir=(0, -1, 0), z_dir=(1, 0, 0))) as fillet_3_piece_21:
        with BuildLine():
            CenterArc((FILLET_3_R, -FILLET_3_R), FILLET_3_R, 90, 90)
            Line((0, -FILLET_3_R), (0, 0))
            Line((0, 0), (FILLET_3_R, 0))
        make_face()
    extrude(amount=39, mode=Mode.SUBTRACT)
    with BuildSketch(Plane(origin=(0, 20, -0.5), x_dir=(0, -1, 0), z_dir=(0, 0, 1))) as fillet_3_piece_22_section:
        with BuildLine():
            CenterArc((FILLET_3_R, FILLET_3_R), FILLET_3_R, 180, 90)
            Line((0, FILLET_3_R), (0, 0))
            Line((0, 0), (FILLET_3_R, 0))
        make_face()
    fillet_3_piece_22 = extrude(amount=42, mode=Mode.PRIVATE)
    fillet_3_piece_22 = split(fillet_3_piece_22, bisect_by=Plane(origin=(0.024008382, 19.336749215, 8), z_dir=(0, 0, -1)), keep=Keep.TOP, mode=Mode.PRIVATE)
    fillet_3_piece_22 = split(fillet_3_piece_22, bisect_by=Plane(origin=(0.024008382, 19.5, 3.75), z_dir=(0, -1, 0)), keep=Keep.TOP, mode=Mode.PRIVATE)
    add(fillet_3_piece_22, mode=Mode.SUBTRACT)
    with BuildSketch(Plane(origin=(0, 20, -0.5), x_dir=(0, -1, 0), z_dir=(0, 0, 1))) as fillet_3_piece_23_section:
        with BuildLine():
            CenterArc((FILLET_3_R, FILLET_3_R), FILLET_3_R, 180, 90)
            Line((0, FILLET_3_R), (0, 0))
            Line((0, 0), (FILLET_3_R, 0))
        make_face()
    fillet_3_piece_23 = extrude(amount=42, mode=Mode.PRIVATE)
    fillet_3_piece_23 = split(fillet_3_piece_23, bisect_by=Plane(origin=(0.25512006, 19.835608236, 8), z_dir=(0, 0, -1)), keep=Keep.TOP, mode=Mode.PRIVATE)
    fillet_3_piece_23 = split(fillet_3_piece_23, bisect_by=Plane(origin=(0.25512006, 19.5, 3.75), z_dir=(0, 1, 0)), keep=Keep.TOP, mode=Mode.PRIVATE)
    add(fillet_3_piece_23, mode=Mode.SUBTRACT)
    with BuildSketch(Plane(origin=(0, 20, -0.5), x_dir=(0, -1, 0), z_dir=(0, 0, 1))) as fillet_3_piece_24_section:
        with BuildLine():
            CenterArc((FILLET_3_R, FILLET_3_R), FILLET_3_R, 180, 90)
            Line((0, FILLET_3_R), (0, 0))
            Line((0, 0), (FILLET_3_R, 0))
        make_face()
    fillet_3_piece_24 = extrude(amount=42, mode=Mode.PRIVATE)
    fillet_3_piece_24 = split(fillet_3_piece_24, bisect_by=Plane(origin=(0.25512006, 19.835608236, 11), z_dir=(0, 0, -1)), keep=Keep.TOP, mode=Mode.PRIVATE)
    fillet_3_piece_24 = split(fillet_3_piece_24, bisect_by=Plane(origin=(0.25512006, 19.835608236, 8), z_dir=(0, 0, 1)), keep=Keep.TOP, mode=Mode.PRIVATE)
    fillet_3_piece_24 = split(fillet_3_piece_24, bisect_by=Plane(origin=(0.25512006, 19.5, 9.5), z_dir=(0, 1, 0)), keep=Keep.TOP, mode=Mode.PRIVATE)
    add(fillet_3_piece_24, mode=Mode.SUBTRACT)
    with BuildSketch(Plane(origin=(0, 20, -0.5), x_dir=(0, -1, 0), z_dir=(0, 0, 1))) as fillet_3_piece_25_section:
        with BuildLine():
            CenterArc((FILLET_3_R, FILLET_3_R), FILLET_3_R, 180, 90)
            Line((0, FILLET_3_R), (0, 0))
            Line((0, 0), (FILLET_3_R, 0))
        make_face()
    fillet_3_piece_25 = extrude(amount=42, mode=Mode.PRIVATE)
    fillet_3_piece_25 = split(fillet_3_piece_25, bisect_by=Plane(origin=(0.024008382, 19.336749215, 11), z_dir=(0, 0, 1)), keep=Keep.TOP, mode=Mode.PRIVATE)
    fillet_3_piece_25 = split(fillet_3_piece_25, bisect_by=Plane(origin=(0.024008382, 19.5, 26.25), z_dir=(0, -1, 0)), keep=Keep.TOP, mode=Mode.PRIVATE)
    add(fillet_3_piece_25, mode=Mode.SUBTRACT)
    with BuildSketch(Plane(origin=(0, 20, -0.5), x_dir=(0, -1, 0), z_dir=(0, 0, 1))) as fillet_3_piece_26_section:
        with BuildLine():
            CenterArc((FILLET_3_R, FILLET_3_R), FILLET_3_R, 180, 90)
            Line((0, FILLET_3_R), (0, 0))
            Line((0, 0), (FILLET_3_R, 0))
        make_face()
    fillet_3_piece_26 = extrude(amount=42, mode=Mode.PRIVATE)
    fillet_3_piece_26 = split(fillet_3_piece_26, bisect_by=Plane(origin=(0.25512006, 19.835608236, 11), z_dir=(0, 0, 1)), keep=Keep.TOP, mode=Mode.PRIVATE)
    fillet_3_piece_26 = split(fillet_3_piece_26, bisect_by=Plane(origin=(0.25512006, 19.5, 26.25), z_dir=(0, 1, 0)), keep=Keep.TOP, mode=Mode.PRIVATE)
    add(fillet_3_piece_26, mode=Mode.SUBTRACT)


solid = part.part
